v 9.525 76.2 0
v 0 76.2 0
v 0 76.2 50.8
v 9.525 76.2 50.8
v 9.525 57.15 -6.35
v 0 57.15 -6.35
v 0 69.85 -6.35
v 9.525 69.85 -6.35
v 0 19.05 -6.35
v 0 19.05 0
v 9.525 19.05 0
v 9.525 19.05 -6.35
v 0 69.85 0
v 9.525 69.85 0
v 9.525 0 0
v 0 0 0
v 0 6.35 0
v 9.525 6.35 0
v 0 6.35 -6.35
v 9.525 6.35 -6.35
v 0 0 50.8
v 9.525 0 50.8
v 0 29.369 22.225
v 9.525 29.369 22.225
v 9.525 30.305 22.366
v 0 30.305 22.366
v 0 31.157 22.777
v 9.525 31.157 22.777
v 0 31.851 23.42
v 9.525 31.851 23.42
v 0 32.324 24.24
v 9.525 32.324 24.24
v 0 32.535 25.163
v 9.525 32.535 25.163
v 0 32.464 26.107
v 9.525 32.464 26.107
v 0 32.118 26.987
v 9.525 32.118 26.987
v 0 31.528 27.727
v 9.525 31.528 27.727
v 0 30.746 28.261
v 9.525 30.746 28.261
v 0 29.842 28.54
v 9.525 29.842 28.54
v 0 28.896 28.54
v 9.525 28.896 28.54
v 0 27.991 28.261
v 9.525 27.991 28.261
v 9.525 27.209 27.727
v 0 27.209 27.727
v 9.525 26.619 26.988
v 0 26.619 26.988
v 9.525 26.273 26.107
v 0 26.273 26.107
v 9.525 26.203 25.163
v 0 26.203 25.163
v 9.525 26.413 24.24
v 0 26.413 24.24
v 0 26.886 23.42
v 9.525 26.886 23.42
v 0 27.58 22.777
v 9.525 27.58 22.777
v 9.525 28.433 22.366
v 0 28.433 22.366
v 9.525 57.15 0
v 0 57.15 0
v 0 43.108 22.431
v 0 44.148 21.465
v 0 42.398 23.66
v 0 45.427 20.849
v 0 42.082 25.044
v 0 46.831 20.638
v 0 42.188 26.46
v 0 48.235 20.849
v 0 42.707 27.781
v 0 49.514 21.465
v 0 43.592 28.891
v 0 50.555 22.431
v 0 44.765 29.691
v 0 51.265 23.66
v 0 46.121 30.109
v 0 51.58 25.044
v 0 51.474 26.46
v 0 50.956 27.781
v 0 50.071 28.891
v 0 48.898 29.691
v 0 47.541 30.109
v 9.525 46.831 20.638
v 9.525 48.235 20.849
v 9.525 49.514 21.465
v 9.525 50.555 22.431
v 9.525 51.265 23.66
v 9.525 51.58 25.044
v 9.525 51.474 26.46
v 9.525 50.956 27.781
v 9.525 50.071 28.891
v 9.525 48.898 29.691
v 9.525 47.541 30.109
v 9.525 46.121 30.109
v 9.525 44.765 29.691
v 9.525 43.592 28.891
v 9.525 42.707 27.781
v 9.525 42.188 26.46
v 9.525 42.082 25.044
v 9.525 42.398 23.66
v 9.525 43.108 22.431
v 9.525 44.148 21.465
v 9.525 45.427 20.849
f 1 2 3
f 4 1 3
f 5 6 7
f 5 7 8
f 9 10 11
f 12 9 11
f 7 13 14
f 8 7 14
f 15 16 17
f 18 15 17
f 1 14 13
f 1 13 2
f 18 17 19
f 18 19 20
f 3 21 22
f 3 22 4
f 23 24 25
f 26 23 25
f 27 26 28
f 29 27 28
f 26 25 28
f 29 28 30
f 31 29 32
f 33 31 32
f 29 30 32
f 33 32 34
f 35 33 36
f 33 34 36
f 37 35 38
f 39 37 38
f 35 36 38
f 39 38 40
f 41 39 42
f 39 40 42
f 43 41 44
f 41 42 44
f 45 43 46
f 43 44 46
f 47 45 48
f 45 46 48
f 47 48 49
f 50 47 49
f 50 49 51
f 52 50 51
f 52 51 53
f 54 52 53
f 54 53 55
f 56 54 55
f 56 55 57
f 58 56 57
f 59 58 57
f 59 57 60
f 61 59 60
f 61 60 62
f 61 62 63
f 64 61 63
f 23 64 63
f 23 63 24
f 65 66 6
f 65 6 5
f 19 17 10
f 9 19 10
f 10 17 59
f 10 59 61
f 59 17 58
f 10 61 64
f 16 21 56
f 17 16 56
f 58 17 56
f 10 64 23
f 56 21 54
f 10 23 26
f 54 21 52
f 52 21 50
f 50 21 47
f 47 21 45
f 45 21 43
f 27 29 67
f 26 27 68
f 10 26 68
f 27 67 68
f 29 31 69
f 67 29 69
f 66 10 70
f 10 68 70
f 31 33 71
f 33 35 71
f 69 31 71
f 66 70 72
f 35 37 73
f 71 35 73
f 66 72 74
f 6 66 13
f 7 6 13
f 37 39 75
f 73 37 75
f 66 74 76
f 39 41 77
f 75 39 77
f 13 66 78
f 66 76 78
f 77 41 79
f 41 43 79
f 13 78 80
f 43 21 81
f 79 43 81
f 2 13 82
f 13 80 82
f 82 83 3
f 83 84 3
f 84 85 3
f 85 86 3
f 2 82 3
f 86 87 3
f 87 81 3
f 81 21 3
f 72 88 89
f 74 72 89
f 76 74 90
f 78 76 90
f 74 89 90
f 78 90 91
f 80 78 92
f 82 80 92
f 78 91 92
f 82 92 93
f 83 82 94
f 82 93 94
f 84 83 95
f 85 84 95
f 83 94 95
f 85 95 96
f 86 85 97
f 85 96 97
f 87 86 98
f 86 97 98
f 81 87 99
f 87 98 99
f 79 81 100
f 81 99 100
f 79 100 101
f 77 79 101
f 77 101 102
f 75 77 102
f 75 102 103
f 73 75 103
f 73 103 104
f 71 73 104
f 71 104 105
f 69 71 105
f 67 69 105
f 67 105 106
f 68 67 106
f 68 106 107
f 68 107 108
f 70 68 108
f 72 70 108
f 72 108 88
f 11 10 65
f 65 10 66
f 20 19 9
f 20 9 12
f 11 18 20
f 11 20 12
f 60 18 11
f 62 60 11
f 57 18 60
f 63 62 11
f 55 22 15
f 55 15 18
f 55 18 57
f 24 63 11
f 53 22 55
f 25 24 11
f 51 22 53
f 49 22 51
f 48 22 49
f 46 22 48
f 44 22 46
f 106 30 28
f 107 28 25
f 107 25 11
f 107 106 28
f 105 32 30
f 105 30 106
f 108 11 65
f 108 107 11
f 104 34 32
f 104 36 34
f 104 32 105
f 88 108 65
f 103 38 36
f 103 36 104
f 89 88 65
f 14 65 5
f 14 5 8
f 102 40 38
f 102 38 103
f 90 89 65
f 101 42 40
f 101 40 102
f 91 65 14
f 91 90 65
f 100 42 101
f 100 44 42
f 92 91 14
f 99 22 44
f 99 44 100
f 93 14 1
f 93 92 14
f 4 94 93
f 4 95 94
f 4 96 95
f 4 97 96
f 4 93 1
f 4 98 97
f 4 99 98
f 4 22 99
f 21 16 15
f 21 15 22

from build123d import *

# Parameters (mm, degrees)
SKETCH1_W           = 76.2
SKETCH1_H           = 50.8
BOSS_EXTRUDE1_DEPTH = 9.525
SKETCH3_R           = 3.175
SKETCH3_R_2         = 4.7625
CUT_EXTRUDE1_DEPTH  = 93.075
SKETCH4_W           = 9.525
SKETCH4_H           = 12.7
BOSS_EXTRUDE2_DEPTH = 6.35


with BuildPart() as part:
    # Sketch1 → Boss-Extrude1 (new body)
    with BuildSketch(Plane.YZ):
        with Locations((38.1, 25.4)):
            Rectangle(SKETCH1_W, SKETCH1_H)
    extrude(amount=BOSS_EXTRUDE1_DEPTH)

    # Sketch3 → Cut-Extrude1 (cut, through all)
    with BuildSketch(Plane.YZ.offset(9.525)):
        with Locations(Location((29.36875, 25.4, 0), (0, 0, 270))):
            Circle(SKETCH3_R)
        with Locations(Location((46.83125, 25.4, 0), (0, 0, 270))):
            Circle(SKETCH3_R_2)
    extrude(amount=-CUT_EXTRUDE1_DEPTH, mode=Mode.SUBTRACT)

    # Sketch4 → Boss-Extrude2 (add)
    with BuildSketch(Plane(origin=(0, 0, 0), x_dir=(1, 0, 0), z_dir=(0, 0, -1))):
        with Locations((4.7625, -12.7)):
            Rectangle(SKETCH4_W, SKETCH4_H)
        with Locations((4.7625, -63.5)):
            Rectangle(SKETCH4_W, SKETCH4_H)
    extrude(amount=BOSS_EXTRUDE2_DEPTH)


solid = part.part
